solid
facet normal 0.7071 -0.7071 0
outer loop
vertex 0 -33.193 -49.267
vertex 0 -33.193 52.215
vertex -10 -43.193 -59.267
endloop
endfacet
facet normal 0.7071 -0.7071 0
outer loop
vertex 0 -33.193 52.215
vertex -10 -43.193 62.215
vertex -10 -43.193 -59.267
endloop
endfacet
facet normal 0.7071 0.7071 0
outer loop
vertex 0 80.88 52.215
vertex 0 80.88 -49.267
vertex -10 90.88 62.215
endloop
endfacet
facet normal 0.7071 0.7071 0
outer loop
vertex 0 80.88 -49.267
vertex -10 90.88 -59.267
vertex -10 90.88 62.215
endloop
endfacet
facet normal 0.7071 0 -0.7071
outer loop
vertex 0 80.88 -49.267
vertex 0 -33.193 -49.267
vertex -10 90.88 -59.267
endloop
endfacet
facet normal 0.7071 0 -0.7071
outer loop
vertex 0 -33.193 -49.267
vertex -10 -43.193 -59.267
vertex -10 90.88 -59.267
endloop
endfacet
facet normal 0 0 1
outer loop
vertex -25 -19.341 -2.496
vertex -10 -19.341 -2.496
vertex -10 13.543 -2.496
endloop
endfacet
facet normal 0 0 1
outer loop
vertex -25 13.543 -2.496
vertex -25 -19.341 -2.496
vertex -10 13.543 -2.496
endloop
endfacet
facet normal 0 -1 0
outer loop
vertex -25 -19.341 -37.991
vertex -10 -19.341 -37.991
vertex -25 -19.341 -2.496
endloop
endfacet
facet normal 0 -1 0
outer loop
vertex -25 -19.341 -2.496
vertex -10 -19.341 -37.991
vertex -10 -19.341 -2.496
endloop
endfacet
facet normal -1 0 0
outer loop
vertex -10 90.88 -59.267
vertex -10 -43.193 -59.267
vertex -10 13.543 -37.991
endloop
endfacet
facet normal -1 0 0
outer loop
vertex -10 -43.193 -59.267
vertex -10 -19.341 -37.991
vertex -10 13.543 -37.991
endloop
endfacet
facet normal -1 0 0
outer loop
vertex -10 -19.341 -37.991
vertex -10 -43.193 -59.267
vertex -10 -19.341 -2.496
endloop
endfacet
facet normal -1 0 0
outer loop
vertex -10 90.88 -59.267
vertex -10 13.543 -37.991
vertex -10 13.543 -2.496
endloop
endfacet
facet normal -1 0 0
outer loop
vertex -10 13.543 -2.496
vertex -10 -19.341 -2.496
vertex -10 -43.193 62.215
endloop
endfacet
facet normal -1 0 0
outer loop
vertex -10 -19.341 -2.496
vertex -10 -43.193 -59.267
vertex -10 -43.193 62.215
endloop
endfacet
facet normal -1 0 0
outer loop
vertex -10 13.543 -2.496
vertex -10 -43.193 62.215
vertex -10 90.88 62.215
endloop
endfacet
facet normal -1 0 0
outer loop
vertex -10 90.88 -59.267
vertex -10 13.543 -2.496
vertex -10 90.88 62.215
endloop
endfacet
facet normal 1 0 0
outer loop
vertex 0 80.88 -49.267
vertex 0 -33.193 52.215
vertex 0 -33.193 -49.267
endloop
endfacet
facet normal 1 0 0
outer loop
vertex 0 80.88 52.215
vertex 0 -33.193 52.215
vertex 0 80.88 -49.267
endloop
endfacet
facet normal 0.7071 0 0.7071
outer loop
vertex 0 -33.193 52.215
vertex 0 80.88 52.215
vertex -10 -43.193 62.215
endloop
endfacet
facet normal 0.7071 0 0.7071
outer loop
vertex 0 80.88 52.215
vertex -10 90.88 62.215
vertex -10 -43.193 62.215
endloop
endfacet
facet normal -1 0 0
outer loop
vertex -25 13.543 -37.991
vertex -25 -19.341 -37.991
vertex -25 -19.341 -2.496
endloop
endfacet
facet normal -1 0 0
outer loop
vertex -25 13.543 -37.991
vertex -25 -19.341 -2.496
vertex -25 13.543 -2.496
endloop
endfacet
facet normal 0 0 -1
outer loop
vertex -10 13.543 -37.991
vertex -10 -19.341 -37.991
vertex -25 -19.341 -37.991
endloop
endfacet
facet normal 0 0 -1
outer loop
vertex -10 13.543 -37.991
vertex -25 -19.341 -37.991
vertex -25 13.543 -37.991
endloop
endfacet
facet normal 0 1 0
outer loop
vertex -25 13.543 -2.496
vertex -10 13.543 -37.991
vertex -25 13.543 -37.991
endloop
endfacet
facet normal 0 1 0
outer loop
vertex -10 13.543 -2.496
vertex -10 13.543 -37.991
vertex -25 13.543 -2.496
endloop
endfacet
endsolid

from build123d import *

# Parameters (mm, degrees)
F0_W     = 114.0731200576
F0_H     = 101.4817282557
F1_DEPTH = 10
F1_TAPER = -45
F2_W     = 32.8839123249
F2_H     = 35.4949785396
F3_DEPTH = 25


with BuildPart() as f1:
    # F0 (on Right) → F1 (new body)
    with BuildSketch(Plane.YZ):
        with Locations((23.8430835307, 1.4738403261)):
            Rectangle(F0_W, F0_H)
    extrude(amount=-F1_DEPTH, taper=F1_TAPER)

    # F2 (on face) → F3 (join)
    with BuildSketch(Plane.YZ):
        with Locations((-2.8988905251, -20.2437178232)):
            Rectangle(F2_W, F2_H)
    extrude(amount=-F3_DEPTH)


solid = f1.part
